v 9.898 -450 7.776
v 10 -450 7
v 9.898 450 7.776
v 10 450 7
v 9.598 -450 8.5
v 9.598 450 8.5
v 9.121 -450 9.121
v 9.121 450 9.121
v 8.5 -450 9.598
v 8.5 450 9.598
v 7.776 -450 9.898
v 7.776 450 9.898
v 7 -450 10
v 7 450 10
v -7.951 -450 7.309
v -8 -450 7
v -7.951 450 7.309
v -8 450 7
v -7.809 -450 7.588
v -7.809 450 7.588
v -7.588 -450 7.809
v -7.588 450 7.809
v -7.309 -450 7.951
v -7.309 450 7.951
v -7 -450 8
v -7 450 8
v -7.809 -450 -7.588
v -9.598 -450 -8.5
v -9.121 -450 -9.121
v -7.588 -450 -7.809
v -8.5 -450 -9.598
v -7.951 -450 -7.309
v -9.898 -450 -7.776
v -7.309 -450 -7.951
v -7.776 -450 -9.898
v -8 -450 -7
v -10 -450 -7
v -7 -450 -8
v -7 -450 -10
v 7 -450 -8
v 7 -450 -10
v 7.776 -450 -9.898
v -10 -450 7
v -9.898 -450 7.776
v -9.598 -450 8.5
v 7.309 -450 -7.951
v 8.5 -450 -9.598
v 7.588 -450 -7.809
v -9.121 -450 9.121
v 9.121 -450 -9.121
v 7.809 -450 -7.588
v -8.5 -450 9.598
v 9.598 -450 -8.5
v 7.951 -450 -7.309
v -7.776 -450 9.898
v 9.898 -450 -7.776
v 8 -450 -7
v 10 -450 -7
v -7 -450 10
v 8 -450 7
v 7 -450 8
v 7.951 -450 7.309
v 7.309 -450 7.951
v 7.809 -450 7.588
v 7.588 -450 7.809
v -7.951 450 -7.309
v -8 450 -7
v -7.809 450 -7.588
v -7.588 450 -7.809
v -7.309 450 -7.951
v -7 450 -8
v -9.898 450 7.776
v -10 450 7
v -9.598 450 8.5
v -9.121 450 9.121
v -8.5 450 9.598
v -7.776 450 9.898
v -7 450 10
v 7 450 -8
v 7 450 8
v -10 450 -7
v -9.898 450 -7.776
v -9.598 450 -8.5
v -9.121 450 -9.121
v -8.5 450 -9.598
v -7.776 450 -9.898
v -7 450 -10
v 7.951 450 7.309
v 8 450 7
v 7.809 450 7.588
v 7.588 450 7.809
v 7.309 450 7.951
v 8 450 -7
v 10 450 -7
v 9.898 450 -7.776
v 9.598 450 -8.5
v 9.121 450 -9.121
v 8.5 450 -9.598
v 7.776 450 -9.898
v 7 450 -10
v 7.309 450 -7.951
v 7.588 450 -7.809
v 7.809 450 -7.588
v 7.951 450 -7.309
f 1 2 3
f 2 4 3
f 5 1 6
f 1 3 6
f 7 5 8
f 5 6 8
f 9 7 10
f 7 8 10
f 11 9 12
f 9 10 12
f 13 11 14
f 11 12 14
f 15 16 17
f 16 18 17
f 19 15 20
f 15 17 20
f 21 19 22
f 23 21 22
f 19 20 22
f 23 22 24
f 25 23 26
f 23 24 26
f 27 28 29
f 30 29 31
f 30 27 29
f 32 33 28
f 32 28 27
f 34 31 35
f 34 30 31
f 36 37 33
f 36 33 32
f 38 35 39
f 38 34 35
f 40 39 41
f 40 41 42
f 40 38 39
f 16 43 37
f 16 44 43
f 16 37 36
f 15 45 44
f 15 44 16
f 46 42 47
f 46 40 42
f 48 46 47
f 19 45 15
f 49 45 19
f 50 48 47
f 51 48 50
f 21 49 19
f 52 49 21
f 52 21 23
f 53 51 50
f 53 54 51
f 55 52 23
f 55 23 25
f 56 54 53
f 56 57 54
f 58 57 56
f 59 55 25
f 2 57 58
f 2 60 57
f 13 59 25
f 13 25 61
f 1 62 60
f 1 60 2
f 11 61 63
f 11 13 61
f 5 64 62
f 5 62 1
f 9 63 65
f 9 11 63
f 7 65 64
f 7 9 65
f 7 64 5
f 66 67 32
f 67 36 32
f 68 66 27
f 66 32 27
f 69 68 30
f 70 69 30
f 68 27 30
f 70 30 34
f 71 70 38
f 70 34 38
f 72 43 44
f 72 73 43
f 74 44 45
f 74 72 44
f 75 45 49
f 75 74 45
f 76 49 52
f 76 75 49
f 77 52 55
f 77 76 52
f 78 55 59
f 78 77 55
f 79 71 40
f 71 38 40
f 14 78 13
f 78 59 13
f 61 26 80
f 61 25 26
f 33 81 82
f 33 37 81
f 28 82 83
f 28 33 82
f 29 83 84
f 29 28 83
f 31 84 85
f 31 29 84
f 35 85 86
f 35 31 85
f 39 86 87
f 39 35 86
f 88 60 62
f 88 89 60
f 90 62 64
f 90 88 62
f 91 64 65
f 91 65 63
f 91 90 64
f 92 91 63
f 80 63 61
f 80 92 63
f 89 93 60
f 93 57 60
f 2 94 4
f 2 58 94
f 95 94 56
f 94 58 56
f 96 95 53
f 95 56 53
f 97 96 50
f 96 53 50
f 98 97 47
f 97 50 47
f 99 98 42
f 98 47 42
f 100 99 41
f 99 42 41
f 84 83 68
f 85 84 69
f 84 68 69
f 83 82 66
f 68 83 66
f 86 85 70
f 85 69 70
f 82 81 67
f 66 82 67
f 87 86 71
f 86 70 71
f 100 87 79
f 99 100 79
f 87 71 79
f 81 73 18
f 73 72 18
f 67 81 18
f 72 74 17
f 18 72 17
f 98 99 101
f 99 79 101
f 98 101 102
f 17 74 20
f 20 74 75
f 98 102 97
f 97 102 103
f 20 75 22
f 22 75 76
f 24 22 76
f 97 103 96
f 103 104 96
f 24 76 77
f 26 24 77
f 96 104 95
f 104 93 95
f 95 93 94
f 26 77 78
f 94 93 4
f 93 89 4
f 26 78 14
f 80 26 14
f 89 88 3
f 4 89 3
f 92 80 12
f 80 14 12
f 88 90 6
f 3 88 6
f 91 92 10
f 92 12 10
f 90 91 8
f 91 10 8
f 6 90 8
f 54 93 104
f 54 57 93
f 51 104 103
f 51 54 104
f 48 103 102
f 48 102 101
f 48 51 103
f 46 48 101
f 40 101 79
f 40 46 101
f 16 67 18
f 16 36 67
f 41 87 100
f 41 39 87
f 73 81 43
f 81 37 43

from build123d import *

# Parameters (mm, degrees)
F2_W     = 20
F2_H     = 20
F3_DEPTH = 450
F4_R     = 3
F5_T     = -2


with BuildPart() as f3:
    # F2 (on Front) → F3 (new body, symmetric)
    with BuildSketch(Plane.XZ):
        Rectangle(F2_W, F2_H)
    extrude(amount=F3_DEPTH, both=True)

    # F4
    f4_edges = [f3.edges().sort_by_distance(p)[0] for p in [
        (10, 0, 10),
        (-10, 0, 10),
        (10, 0, -10),
        (-10, 0, -10),
    ]]
    fillet(f4_edges, radius=F4_R)

    # F5
    f5_openings = [f3.faces().sort_by_distance(p)[0] for p in [
        (0, -450, 0),
        (0, 450, 0),
    ]]
    offset(amount=F5_T, openings=f5_openings)


solid = f3.part
